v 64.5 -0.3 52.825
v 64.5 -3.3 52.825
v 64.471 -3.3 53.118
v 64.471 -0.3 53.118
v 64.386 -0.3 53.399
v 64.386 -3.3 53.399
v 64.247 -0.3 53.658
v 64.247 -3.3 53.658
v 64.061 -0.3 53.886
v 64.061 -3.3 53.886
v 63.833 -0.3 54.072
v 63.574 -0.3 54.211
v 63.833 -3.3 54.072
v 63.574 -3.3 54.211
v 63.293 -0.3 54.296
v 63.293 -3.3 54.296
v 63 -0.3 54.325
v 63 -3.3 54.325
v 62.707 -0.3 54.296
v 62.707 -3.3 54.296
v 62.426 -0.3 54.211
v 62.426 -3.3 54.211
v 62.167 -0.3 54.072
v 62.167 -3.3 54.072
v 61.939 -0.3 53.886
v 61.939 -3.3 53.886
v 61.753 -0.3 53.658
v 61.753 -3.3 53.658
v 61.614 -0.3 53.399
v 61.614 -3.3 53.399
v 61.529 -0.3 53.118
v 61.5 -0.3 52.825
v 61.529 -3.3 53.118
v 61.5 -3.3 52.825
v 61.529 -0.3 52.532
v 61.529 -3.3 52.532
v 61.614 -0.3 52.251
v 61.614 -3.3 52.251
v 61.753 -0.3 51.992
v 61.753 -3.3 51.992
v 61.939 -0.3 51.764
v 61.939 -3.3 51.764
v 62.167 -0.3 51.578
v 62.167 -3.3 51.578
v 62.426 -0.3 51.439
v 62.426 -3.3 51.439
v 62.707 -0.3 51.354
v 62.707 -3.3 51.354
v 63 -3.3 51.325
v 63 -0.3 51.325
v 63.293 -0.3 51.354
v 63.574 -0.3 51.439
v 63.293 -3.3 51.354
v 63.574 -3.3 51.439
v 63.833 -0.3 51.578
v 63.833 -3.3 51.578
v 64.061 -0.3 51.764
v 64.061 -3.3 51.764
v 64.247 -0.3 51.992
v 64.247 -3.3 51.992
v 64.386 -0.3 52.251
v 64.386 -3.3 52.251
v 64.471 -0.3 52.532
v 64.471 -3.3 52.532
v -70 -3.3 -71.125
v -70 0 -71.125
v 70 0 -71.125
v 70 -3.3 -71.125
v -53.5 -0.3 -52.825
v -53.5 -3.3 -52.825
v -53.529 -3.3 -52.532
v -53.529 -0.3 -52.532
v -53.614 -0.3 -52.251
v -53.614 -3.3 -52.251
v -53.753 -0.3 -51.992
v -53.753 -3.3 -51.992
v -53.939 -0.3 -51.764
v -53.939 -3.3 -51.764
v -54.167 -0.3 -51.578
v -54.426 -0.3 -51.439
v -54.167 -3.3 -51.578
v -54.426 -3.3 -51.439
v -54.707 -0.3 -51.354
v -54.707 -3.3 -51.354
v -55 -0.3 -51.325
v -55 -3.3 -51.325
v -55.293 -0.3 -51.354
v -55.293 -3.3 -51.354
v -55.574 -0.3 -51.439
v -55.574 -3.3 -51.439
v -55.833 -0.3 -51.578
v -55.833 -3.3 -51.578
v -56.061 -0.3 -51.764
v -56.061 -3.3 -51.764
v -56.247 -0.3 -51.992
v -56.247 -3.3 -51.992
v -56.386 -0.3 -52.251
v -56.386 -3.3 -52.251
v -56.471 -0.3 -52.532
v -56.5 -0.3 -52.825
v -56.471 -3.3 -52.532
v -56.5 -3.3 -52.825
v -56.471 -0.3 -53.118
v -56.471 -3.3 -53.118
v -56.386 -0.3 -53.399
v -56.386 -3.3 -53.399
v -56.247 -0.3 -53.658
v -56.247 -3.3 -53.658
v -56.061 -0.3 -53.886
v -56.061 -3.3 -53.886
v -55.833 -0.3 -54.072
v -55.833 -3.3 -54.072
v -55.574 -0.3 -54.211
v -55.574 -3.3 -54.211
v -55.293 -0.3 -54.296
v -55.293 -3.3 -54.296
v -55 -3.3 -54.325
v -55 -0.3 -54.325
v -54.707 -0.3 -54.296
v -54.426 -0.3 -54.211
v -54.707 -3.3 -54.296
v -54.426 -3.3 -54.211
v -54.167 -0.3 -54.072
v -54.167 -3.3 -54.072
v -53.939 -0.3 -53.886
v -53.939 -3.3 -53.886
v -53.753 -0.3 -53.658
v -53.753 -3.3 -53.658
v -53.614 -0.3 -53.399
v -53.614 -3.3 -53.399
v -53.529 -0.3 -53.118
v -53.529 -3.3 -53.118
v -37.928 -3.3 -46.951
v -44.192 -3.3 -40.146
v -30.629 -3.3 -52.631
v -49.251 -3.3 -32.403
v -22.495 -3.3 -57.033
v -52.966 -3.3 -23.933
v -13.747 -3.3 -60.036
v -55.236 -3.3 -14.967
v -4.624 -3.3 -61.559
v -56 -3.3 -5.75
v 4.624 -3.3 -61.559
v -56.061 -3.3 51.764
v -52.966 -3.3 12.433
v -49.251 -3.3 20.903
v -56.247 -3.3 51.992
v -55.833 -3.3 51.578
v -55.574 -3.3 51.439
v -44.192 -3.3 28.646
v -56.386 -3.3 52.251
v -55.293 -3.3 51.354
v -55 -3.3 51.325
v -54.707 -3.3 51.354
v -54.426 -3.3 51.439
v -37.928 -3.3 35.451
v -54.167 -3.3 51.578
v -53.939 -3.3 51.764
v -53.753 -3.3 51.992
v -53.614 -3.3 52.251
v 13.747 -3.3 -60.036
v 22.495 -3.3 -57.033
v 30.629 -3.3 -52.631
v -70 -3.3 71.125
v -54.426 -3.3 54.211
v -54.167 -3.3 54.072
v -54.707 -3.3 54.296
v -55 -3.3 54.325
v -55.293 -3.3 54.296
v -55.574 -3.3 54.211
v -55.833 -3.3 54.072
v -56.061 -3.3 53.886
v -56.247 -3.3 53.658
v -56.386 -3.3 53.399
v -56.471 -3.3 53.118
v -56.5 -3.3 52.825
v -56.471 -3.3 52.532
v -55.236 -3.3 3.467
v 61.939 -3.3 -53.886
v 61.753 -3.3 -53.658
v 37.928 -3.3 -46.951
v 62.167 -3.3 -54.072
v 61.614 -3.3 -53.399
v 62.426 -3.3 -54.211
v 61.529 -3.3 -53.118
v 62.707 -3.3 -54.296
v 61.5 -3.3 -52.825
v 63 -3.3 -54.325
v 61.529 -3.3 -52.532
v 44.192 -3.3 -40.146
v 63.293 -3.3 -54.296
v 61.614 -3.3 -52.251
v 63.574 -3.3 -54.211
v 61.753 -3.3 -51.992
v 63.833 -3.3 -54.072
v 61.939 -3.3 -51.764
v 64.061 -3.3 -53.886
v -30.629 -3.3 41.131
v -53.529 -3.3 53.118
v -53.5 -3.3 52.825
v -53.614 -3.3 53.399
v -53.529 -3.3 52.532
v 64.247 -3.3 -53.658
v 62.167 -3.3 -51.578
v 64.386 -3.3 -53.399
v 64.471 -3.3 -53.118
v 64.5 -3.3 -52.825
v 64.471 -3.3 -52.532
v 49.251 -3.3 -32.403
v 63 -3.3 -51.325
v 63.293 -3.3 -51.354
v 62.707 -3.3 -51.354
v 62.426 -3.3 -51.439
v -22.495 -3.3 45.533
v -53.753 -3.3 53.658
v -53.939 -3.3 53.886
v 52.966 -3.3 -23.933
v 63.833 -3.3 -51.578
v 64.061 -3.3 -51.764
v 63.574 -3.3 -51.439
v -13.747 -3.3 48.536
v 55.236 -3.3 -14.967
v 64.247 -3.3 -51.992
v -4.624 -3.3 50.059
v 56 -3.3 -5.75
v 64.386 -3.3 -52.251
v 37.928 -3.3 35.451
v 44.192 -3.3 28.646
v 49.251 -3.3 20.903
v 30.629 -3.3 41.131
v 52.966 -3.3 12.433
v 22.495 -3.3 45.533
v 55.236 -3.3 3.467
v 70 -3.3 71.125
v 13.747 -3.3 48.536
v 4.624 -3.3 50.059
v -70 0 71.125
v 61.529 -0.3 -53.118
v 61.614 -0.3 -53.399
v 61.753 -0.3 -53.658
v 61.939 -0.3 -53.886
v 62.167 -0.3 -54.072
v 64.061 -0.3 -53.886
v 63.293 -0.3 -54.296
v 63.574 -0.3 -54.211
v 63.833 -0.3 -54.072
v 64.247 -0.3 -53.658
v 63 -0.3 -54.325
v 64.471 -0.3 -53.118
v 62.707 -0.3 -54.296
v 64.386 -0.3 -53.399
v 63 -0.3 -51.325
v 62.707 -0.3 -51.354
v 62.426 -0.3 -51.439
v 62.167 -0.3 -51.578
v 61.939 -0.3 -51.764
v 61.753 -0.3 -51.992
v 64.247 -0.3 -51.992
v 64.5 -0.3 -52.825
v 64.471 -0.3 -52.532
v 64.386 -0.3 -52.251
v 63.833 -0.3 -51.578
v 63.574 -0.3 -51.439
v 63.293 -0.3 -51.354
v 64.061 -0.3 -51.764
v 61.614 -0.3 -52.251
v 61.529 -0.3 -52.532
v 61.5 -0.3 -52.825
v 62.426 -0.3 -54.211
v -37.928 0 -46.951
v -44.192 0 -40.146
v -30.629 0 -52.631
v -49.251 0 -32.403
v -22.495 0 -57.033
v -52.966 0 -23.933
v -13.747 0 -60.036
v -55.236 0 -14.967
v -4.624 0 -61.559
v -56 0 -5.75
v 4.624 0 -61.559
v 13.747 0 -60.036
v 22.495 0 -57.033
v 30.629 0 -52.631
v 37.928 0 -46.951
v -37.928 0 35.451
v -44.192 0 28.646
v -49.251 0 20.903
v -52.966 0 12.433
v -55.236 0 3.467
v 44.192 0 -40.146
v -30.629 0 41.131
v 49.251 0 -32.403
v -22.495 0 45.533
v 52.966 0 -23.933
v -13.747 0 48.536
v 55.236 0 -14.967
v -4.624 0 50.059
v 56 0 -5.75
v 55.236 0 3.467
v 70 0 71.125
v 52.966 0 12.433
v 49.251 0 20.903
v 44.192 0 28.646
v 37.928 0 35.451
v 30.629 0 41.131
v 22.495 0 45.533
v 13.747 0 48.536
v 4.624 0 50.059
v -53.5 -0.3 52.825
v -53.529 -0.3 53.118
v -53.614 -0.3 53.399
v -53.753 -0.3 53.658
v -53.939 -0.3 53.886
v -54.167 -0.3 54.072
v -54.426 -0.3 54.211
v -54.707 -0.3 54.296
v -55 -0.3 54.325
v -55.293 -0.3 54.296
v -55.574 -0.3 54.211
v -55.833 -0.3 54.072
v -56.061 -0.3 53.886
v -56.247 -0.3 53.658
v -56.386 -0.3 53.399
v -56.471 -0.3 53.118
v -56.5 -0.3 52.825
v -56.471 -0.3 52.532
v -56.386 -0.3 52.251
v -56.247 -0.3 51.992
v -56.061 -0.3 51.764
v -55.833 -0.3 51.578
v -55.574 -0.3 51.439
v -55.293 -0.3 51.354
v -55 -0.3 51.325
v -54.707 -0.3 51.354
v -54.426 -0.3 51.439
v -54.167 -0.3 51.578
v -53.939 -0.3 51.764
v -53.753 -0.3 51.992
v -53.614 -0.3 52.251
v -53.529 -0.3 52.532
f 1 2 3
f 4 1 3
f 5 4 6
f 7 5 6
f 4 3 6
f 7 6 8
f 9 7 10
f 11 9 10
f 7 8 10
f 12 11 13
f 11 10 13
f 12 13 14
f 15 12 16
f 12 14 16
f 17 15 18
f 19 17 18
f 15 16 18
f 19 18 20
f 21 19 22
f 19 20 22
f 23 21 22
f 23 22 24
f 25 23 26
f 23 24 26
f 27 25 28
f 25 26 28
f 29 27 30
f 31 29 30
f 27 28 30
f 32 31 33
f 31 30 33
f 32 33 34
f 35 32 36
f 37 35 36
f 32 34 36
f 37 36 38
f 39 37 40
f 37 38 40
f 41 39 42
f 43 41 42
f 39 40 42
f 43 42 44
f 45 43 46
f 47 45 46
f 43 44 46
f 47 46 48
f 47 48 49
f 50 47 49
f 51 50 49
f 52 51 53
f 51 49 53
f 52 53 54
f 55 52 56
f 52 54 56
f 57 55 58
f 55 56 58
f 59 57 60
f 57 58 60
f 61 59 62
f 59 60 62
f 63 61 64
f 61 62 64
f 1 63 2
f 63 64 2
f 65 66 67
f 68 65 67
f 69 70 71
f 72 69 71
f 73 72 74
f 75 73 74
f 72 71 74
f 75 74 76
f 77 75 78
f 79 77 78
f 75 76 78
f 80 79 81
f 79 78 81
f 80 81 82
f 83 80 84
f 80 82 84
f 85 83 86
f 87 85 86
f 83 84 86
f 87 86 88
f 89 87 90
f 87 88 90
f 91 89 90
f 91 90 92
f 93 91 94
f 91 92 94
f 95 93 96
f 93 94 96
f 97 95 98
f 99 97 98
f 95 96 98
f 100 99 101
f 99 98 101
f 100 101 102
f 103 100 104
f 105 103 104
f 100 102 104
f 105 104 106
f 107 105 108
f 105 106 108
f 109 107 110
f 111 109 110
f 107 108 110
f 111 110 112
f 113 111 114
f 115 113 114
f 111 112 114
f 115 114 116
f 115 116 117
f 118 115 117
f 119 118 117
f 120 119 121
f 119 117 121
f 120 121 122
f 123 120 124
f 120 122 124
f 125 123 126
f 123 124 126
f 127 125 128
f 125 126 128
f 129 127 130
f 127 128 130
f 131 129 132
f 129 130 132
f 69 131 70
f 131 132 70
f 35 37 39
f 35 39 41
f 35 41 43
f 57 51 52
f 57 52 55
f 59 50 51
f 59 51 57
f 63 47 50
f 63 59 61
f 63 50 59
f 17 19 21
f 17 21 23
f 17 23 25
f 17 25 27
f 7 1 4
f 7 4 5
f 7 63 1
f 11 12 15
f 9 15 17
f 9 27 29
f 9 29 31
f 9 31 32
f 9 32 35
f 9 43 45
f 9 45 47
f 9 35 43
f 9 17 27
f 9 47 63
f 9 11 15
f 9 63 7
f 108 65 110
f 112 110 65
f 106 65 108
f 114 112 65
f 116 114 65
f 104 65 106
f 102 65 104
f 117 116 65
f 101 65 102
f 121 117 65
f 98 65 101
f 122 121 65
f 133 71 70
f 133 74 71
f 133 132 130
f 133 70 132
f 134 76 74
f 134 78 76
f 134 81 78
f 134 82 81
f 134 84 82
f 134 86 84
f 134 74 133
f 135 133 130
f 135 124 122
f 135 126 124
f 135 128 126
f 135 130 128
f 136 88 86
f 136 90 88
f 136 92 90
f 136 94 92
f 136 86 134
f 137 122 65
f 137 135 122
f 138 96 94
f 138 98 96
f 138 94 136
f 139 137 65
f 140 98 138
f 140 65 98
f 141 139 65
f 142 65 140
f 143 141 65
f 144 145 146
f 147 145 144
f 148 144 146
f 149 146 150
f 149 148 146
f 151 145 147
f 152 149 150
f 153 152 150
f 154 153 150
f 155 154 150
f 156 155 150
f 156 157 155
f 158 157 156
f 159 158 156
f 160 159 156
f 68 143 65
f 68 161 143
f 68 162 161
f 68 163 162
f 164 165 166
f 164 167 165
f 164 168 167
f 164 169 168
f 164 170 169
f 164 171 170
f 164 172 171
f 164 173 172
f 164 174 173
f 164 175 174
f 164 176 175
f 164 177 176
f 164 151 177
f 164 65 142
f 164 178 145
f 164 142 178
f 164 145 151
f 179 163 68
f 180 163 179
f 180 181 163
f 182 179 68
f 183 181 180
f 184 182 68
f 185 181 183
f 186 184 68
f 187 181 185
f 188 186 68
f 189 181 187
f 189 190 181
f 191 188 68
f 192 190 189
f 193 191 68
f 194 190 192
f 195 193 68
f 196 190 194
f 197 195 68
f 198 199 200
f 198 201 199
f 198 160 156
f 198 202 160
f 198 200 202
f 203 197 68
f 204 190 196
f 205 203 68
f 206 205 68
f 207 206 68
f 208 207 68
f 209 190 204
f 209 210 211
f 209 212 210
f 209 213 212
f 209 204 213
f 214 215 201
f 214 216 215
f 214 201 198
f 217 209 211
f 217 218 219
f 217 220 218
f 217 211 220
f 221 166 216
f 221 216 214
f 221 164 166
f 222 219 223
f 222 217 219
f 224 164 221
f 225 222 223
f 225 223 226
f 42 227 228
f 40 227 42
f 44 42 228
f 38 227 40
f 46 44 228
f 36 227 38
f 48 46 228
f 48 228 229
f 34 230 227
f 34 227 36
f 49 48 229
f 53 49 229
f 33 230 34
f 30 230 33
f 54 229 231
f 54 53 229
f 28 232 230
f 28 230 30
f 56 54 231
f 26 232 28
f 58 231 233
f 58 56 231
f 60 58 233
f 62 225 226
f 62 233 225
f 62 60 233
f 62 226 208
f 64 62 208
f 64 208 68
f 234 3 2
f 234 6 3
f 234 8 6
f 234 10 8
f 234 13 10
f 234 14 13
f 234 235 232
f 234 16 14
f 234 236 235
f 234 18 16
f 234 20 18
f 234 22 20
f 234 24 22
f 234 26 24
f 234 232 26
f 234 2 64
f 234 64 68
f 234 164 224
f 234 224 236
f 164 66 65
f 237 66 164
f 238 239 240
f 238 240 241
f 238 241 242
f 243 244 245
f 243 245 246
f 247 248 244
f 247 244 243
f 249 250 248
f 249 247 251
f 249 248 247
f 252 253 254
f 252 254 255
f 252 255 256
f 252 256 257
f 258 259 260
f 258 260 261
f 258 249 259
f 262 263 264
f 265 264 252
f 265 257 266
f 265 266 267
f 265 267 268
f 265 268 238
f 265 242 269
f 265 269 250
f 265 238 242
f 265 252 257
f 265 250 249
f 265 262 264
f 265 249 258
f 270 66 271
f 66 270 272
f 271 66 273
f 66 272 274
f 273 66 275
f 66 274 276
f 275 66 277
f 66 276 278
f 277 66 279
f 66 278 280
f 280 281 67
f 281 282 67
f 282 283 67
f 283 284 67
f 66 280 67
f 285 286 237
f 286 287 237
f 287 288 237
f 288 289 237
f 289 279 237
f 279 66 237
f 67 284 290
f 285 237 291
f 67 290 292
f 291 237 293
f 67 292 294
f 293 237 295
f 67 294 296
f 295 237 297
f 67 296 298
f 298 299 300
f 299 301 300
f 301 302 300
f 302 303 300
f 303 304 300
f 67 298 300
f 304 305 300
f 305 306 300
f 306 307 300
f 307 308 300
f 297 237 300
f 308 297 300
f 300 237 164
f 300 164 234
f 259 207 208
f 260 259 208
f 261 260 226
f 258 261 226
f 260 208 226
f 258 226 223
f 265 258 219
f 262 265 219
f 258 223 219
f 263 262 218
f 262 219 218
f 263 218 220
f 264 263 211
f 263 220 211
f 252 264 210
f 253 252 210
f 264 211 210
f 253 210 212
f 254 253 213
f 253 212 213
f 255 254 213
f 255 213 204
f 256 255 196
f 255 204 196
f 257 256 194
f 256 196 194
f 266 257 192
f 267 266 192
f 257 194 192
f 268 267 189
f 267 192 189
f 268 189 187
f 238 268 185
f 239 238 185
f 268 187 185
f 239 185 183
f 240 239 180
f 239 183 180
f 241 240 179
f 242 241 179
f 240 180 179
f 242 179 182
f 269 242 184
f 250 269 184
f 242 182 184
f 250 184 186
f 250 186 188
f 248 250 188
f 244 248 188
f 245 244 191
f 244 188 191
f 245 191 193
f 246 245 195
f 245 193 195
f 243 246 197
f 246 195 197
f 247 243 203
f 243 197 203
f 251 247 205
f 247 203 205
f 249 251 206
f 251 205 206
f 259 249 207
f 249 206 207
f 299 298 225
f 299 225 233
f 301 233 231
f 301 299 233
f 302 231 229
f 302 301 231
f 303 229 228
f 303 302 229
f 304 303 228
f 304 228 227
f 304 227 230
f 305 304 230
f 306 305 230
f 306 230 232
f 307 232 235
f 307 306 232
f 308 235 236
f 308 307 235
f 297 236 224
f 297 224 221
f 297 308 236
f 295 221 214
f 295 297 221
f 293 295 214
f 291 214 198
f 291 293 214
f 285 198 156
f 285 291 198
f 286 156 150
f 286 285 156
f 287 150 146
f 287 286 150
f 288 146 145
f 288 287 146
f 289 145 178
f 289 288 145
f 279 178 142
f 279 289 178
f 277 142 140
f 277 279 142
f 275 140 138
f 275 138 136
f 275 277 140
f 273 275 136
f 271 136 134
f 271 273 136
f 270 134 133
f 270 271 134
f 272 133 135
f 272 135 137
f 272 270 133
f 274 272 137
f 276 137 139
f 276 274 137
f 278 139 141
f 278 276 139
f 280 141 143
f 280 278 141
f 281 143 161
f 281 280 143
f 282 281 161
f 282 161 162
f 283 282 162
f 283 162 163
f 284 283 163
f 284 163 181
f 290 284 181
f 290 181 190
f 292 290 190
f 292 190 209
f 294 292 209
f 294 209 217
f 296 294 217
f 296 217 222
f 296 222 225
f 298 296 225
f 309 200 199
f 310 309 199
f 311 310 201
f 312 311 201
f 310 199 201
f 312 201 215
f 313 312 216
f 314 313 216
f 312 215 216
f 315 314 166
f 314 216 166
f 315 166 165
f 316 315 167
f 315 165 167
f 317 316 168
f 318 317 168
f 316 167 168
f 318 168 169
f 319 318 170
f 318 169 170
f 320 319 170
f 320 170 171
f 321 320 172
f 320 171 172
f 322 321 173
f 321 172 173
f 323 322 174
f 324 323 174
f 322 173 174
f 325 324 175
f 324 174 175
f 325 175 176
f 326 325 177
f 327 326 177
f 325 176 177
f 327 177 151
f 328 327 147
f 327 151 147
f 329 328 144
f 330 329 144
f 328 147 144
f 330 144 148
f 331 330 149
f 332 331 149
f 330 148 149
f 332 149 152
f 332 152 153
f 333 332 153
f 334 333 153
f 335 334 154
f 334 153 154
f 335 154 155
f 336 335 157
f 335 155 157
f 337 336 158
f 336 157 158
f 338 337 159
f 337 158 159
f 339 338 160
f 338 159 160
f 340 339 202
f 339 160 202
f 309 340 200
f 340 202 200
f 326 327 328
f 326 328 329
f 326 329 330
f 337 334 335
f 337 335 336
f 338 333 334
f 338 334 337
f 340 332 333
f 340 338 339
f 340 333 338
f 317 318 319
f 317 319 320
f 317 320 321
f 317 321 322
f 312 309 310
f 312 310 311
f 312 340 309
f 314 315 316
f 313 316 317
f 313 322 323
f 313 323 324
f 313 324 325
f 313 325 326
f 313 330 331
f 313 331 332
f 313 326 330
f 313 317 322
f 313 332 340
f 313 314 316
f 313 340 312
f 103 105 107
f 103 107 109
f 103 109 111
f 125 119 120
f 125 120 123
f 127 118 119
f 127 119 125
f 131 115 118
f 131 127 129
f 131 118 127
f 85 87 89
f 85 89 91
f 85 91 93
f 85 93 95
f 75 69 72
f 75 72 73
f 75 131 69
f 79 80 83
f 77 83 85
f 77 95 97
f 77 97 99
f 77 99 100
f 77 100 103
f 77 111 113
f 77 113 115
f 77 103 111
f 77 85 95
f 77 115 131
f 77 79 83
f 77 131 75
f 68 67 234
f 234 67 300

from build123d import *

# Parameters (mm, degrees)
F0_W     = 140
F0_H     = 142.25
F0_R     = 56
F1_DEPTH = 3.3
F2_R     = 1.5
F3_DEPTH = 3


with BuildPart() as f1:
    # F0 (on Front) → F1 (new body)
    with BuildSketch(Plane.XZ):
        Rectangle(F0_W, F0_H)
        with Locations((0, -5.75)):
            Circle(F0_R, mode=Mode.SUBTRACT)
    extrude(amount=F1_DEPTH)

    # F2 (on face) → F3 (cut)
    with BuildSketch(Plane.XZ.offset(3.3)):
        with Locations((63, 52.825)):
            Circle(F2_R)
        with Locations((-55, 52.825)):
            Circle(F2_R)
        with Locations((-55, -52.825)):
            Circle(F2_R)
        with Locations((63, -52.825)):
            Circle(F2_R)
    extrude(amount=-F3_DEPTH, mode=Mode.SUBTRACT)


solid = f1.part
